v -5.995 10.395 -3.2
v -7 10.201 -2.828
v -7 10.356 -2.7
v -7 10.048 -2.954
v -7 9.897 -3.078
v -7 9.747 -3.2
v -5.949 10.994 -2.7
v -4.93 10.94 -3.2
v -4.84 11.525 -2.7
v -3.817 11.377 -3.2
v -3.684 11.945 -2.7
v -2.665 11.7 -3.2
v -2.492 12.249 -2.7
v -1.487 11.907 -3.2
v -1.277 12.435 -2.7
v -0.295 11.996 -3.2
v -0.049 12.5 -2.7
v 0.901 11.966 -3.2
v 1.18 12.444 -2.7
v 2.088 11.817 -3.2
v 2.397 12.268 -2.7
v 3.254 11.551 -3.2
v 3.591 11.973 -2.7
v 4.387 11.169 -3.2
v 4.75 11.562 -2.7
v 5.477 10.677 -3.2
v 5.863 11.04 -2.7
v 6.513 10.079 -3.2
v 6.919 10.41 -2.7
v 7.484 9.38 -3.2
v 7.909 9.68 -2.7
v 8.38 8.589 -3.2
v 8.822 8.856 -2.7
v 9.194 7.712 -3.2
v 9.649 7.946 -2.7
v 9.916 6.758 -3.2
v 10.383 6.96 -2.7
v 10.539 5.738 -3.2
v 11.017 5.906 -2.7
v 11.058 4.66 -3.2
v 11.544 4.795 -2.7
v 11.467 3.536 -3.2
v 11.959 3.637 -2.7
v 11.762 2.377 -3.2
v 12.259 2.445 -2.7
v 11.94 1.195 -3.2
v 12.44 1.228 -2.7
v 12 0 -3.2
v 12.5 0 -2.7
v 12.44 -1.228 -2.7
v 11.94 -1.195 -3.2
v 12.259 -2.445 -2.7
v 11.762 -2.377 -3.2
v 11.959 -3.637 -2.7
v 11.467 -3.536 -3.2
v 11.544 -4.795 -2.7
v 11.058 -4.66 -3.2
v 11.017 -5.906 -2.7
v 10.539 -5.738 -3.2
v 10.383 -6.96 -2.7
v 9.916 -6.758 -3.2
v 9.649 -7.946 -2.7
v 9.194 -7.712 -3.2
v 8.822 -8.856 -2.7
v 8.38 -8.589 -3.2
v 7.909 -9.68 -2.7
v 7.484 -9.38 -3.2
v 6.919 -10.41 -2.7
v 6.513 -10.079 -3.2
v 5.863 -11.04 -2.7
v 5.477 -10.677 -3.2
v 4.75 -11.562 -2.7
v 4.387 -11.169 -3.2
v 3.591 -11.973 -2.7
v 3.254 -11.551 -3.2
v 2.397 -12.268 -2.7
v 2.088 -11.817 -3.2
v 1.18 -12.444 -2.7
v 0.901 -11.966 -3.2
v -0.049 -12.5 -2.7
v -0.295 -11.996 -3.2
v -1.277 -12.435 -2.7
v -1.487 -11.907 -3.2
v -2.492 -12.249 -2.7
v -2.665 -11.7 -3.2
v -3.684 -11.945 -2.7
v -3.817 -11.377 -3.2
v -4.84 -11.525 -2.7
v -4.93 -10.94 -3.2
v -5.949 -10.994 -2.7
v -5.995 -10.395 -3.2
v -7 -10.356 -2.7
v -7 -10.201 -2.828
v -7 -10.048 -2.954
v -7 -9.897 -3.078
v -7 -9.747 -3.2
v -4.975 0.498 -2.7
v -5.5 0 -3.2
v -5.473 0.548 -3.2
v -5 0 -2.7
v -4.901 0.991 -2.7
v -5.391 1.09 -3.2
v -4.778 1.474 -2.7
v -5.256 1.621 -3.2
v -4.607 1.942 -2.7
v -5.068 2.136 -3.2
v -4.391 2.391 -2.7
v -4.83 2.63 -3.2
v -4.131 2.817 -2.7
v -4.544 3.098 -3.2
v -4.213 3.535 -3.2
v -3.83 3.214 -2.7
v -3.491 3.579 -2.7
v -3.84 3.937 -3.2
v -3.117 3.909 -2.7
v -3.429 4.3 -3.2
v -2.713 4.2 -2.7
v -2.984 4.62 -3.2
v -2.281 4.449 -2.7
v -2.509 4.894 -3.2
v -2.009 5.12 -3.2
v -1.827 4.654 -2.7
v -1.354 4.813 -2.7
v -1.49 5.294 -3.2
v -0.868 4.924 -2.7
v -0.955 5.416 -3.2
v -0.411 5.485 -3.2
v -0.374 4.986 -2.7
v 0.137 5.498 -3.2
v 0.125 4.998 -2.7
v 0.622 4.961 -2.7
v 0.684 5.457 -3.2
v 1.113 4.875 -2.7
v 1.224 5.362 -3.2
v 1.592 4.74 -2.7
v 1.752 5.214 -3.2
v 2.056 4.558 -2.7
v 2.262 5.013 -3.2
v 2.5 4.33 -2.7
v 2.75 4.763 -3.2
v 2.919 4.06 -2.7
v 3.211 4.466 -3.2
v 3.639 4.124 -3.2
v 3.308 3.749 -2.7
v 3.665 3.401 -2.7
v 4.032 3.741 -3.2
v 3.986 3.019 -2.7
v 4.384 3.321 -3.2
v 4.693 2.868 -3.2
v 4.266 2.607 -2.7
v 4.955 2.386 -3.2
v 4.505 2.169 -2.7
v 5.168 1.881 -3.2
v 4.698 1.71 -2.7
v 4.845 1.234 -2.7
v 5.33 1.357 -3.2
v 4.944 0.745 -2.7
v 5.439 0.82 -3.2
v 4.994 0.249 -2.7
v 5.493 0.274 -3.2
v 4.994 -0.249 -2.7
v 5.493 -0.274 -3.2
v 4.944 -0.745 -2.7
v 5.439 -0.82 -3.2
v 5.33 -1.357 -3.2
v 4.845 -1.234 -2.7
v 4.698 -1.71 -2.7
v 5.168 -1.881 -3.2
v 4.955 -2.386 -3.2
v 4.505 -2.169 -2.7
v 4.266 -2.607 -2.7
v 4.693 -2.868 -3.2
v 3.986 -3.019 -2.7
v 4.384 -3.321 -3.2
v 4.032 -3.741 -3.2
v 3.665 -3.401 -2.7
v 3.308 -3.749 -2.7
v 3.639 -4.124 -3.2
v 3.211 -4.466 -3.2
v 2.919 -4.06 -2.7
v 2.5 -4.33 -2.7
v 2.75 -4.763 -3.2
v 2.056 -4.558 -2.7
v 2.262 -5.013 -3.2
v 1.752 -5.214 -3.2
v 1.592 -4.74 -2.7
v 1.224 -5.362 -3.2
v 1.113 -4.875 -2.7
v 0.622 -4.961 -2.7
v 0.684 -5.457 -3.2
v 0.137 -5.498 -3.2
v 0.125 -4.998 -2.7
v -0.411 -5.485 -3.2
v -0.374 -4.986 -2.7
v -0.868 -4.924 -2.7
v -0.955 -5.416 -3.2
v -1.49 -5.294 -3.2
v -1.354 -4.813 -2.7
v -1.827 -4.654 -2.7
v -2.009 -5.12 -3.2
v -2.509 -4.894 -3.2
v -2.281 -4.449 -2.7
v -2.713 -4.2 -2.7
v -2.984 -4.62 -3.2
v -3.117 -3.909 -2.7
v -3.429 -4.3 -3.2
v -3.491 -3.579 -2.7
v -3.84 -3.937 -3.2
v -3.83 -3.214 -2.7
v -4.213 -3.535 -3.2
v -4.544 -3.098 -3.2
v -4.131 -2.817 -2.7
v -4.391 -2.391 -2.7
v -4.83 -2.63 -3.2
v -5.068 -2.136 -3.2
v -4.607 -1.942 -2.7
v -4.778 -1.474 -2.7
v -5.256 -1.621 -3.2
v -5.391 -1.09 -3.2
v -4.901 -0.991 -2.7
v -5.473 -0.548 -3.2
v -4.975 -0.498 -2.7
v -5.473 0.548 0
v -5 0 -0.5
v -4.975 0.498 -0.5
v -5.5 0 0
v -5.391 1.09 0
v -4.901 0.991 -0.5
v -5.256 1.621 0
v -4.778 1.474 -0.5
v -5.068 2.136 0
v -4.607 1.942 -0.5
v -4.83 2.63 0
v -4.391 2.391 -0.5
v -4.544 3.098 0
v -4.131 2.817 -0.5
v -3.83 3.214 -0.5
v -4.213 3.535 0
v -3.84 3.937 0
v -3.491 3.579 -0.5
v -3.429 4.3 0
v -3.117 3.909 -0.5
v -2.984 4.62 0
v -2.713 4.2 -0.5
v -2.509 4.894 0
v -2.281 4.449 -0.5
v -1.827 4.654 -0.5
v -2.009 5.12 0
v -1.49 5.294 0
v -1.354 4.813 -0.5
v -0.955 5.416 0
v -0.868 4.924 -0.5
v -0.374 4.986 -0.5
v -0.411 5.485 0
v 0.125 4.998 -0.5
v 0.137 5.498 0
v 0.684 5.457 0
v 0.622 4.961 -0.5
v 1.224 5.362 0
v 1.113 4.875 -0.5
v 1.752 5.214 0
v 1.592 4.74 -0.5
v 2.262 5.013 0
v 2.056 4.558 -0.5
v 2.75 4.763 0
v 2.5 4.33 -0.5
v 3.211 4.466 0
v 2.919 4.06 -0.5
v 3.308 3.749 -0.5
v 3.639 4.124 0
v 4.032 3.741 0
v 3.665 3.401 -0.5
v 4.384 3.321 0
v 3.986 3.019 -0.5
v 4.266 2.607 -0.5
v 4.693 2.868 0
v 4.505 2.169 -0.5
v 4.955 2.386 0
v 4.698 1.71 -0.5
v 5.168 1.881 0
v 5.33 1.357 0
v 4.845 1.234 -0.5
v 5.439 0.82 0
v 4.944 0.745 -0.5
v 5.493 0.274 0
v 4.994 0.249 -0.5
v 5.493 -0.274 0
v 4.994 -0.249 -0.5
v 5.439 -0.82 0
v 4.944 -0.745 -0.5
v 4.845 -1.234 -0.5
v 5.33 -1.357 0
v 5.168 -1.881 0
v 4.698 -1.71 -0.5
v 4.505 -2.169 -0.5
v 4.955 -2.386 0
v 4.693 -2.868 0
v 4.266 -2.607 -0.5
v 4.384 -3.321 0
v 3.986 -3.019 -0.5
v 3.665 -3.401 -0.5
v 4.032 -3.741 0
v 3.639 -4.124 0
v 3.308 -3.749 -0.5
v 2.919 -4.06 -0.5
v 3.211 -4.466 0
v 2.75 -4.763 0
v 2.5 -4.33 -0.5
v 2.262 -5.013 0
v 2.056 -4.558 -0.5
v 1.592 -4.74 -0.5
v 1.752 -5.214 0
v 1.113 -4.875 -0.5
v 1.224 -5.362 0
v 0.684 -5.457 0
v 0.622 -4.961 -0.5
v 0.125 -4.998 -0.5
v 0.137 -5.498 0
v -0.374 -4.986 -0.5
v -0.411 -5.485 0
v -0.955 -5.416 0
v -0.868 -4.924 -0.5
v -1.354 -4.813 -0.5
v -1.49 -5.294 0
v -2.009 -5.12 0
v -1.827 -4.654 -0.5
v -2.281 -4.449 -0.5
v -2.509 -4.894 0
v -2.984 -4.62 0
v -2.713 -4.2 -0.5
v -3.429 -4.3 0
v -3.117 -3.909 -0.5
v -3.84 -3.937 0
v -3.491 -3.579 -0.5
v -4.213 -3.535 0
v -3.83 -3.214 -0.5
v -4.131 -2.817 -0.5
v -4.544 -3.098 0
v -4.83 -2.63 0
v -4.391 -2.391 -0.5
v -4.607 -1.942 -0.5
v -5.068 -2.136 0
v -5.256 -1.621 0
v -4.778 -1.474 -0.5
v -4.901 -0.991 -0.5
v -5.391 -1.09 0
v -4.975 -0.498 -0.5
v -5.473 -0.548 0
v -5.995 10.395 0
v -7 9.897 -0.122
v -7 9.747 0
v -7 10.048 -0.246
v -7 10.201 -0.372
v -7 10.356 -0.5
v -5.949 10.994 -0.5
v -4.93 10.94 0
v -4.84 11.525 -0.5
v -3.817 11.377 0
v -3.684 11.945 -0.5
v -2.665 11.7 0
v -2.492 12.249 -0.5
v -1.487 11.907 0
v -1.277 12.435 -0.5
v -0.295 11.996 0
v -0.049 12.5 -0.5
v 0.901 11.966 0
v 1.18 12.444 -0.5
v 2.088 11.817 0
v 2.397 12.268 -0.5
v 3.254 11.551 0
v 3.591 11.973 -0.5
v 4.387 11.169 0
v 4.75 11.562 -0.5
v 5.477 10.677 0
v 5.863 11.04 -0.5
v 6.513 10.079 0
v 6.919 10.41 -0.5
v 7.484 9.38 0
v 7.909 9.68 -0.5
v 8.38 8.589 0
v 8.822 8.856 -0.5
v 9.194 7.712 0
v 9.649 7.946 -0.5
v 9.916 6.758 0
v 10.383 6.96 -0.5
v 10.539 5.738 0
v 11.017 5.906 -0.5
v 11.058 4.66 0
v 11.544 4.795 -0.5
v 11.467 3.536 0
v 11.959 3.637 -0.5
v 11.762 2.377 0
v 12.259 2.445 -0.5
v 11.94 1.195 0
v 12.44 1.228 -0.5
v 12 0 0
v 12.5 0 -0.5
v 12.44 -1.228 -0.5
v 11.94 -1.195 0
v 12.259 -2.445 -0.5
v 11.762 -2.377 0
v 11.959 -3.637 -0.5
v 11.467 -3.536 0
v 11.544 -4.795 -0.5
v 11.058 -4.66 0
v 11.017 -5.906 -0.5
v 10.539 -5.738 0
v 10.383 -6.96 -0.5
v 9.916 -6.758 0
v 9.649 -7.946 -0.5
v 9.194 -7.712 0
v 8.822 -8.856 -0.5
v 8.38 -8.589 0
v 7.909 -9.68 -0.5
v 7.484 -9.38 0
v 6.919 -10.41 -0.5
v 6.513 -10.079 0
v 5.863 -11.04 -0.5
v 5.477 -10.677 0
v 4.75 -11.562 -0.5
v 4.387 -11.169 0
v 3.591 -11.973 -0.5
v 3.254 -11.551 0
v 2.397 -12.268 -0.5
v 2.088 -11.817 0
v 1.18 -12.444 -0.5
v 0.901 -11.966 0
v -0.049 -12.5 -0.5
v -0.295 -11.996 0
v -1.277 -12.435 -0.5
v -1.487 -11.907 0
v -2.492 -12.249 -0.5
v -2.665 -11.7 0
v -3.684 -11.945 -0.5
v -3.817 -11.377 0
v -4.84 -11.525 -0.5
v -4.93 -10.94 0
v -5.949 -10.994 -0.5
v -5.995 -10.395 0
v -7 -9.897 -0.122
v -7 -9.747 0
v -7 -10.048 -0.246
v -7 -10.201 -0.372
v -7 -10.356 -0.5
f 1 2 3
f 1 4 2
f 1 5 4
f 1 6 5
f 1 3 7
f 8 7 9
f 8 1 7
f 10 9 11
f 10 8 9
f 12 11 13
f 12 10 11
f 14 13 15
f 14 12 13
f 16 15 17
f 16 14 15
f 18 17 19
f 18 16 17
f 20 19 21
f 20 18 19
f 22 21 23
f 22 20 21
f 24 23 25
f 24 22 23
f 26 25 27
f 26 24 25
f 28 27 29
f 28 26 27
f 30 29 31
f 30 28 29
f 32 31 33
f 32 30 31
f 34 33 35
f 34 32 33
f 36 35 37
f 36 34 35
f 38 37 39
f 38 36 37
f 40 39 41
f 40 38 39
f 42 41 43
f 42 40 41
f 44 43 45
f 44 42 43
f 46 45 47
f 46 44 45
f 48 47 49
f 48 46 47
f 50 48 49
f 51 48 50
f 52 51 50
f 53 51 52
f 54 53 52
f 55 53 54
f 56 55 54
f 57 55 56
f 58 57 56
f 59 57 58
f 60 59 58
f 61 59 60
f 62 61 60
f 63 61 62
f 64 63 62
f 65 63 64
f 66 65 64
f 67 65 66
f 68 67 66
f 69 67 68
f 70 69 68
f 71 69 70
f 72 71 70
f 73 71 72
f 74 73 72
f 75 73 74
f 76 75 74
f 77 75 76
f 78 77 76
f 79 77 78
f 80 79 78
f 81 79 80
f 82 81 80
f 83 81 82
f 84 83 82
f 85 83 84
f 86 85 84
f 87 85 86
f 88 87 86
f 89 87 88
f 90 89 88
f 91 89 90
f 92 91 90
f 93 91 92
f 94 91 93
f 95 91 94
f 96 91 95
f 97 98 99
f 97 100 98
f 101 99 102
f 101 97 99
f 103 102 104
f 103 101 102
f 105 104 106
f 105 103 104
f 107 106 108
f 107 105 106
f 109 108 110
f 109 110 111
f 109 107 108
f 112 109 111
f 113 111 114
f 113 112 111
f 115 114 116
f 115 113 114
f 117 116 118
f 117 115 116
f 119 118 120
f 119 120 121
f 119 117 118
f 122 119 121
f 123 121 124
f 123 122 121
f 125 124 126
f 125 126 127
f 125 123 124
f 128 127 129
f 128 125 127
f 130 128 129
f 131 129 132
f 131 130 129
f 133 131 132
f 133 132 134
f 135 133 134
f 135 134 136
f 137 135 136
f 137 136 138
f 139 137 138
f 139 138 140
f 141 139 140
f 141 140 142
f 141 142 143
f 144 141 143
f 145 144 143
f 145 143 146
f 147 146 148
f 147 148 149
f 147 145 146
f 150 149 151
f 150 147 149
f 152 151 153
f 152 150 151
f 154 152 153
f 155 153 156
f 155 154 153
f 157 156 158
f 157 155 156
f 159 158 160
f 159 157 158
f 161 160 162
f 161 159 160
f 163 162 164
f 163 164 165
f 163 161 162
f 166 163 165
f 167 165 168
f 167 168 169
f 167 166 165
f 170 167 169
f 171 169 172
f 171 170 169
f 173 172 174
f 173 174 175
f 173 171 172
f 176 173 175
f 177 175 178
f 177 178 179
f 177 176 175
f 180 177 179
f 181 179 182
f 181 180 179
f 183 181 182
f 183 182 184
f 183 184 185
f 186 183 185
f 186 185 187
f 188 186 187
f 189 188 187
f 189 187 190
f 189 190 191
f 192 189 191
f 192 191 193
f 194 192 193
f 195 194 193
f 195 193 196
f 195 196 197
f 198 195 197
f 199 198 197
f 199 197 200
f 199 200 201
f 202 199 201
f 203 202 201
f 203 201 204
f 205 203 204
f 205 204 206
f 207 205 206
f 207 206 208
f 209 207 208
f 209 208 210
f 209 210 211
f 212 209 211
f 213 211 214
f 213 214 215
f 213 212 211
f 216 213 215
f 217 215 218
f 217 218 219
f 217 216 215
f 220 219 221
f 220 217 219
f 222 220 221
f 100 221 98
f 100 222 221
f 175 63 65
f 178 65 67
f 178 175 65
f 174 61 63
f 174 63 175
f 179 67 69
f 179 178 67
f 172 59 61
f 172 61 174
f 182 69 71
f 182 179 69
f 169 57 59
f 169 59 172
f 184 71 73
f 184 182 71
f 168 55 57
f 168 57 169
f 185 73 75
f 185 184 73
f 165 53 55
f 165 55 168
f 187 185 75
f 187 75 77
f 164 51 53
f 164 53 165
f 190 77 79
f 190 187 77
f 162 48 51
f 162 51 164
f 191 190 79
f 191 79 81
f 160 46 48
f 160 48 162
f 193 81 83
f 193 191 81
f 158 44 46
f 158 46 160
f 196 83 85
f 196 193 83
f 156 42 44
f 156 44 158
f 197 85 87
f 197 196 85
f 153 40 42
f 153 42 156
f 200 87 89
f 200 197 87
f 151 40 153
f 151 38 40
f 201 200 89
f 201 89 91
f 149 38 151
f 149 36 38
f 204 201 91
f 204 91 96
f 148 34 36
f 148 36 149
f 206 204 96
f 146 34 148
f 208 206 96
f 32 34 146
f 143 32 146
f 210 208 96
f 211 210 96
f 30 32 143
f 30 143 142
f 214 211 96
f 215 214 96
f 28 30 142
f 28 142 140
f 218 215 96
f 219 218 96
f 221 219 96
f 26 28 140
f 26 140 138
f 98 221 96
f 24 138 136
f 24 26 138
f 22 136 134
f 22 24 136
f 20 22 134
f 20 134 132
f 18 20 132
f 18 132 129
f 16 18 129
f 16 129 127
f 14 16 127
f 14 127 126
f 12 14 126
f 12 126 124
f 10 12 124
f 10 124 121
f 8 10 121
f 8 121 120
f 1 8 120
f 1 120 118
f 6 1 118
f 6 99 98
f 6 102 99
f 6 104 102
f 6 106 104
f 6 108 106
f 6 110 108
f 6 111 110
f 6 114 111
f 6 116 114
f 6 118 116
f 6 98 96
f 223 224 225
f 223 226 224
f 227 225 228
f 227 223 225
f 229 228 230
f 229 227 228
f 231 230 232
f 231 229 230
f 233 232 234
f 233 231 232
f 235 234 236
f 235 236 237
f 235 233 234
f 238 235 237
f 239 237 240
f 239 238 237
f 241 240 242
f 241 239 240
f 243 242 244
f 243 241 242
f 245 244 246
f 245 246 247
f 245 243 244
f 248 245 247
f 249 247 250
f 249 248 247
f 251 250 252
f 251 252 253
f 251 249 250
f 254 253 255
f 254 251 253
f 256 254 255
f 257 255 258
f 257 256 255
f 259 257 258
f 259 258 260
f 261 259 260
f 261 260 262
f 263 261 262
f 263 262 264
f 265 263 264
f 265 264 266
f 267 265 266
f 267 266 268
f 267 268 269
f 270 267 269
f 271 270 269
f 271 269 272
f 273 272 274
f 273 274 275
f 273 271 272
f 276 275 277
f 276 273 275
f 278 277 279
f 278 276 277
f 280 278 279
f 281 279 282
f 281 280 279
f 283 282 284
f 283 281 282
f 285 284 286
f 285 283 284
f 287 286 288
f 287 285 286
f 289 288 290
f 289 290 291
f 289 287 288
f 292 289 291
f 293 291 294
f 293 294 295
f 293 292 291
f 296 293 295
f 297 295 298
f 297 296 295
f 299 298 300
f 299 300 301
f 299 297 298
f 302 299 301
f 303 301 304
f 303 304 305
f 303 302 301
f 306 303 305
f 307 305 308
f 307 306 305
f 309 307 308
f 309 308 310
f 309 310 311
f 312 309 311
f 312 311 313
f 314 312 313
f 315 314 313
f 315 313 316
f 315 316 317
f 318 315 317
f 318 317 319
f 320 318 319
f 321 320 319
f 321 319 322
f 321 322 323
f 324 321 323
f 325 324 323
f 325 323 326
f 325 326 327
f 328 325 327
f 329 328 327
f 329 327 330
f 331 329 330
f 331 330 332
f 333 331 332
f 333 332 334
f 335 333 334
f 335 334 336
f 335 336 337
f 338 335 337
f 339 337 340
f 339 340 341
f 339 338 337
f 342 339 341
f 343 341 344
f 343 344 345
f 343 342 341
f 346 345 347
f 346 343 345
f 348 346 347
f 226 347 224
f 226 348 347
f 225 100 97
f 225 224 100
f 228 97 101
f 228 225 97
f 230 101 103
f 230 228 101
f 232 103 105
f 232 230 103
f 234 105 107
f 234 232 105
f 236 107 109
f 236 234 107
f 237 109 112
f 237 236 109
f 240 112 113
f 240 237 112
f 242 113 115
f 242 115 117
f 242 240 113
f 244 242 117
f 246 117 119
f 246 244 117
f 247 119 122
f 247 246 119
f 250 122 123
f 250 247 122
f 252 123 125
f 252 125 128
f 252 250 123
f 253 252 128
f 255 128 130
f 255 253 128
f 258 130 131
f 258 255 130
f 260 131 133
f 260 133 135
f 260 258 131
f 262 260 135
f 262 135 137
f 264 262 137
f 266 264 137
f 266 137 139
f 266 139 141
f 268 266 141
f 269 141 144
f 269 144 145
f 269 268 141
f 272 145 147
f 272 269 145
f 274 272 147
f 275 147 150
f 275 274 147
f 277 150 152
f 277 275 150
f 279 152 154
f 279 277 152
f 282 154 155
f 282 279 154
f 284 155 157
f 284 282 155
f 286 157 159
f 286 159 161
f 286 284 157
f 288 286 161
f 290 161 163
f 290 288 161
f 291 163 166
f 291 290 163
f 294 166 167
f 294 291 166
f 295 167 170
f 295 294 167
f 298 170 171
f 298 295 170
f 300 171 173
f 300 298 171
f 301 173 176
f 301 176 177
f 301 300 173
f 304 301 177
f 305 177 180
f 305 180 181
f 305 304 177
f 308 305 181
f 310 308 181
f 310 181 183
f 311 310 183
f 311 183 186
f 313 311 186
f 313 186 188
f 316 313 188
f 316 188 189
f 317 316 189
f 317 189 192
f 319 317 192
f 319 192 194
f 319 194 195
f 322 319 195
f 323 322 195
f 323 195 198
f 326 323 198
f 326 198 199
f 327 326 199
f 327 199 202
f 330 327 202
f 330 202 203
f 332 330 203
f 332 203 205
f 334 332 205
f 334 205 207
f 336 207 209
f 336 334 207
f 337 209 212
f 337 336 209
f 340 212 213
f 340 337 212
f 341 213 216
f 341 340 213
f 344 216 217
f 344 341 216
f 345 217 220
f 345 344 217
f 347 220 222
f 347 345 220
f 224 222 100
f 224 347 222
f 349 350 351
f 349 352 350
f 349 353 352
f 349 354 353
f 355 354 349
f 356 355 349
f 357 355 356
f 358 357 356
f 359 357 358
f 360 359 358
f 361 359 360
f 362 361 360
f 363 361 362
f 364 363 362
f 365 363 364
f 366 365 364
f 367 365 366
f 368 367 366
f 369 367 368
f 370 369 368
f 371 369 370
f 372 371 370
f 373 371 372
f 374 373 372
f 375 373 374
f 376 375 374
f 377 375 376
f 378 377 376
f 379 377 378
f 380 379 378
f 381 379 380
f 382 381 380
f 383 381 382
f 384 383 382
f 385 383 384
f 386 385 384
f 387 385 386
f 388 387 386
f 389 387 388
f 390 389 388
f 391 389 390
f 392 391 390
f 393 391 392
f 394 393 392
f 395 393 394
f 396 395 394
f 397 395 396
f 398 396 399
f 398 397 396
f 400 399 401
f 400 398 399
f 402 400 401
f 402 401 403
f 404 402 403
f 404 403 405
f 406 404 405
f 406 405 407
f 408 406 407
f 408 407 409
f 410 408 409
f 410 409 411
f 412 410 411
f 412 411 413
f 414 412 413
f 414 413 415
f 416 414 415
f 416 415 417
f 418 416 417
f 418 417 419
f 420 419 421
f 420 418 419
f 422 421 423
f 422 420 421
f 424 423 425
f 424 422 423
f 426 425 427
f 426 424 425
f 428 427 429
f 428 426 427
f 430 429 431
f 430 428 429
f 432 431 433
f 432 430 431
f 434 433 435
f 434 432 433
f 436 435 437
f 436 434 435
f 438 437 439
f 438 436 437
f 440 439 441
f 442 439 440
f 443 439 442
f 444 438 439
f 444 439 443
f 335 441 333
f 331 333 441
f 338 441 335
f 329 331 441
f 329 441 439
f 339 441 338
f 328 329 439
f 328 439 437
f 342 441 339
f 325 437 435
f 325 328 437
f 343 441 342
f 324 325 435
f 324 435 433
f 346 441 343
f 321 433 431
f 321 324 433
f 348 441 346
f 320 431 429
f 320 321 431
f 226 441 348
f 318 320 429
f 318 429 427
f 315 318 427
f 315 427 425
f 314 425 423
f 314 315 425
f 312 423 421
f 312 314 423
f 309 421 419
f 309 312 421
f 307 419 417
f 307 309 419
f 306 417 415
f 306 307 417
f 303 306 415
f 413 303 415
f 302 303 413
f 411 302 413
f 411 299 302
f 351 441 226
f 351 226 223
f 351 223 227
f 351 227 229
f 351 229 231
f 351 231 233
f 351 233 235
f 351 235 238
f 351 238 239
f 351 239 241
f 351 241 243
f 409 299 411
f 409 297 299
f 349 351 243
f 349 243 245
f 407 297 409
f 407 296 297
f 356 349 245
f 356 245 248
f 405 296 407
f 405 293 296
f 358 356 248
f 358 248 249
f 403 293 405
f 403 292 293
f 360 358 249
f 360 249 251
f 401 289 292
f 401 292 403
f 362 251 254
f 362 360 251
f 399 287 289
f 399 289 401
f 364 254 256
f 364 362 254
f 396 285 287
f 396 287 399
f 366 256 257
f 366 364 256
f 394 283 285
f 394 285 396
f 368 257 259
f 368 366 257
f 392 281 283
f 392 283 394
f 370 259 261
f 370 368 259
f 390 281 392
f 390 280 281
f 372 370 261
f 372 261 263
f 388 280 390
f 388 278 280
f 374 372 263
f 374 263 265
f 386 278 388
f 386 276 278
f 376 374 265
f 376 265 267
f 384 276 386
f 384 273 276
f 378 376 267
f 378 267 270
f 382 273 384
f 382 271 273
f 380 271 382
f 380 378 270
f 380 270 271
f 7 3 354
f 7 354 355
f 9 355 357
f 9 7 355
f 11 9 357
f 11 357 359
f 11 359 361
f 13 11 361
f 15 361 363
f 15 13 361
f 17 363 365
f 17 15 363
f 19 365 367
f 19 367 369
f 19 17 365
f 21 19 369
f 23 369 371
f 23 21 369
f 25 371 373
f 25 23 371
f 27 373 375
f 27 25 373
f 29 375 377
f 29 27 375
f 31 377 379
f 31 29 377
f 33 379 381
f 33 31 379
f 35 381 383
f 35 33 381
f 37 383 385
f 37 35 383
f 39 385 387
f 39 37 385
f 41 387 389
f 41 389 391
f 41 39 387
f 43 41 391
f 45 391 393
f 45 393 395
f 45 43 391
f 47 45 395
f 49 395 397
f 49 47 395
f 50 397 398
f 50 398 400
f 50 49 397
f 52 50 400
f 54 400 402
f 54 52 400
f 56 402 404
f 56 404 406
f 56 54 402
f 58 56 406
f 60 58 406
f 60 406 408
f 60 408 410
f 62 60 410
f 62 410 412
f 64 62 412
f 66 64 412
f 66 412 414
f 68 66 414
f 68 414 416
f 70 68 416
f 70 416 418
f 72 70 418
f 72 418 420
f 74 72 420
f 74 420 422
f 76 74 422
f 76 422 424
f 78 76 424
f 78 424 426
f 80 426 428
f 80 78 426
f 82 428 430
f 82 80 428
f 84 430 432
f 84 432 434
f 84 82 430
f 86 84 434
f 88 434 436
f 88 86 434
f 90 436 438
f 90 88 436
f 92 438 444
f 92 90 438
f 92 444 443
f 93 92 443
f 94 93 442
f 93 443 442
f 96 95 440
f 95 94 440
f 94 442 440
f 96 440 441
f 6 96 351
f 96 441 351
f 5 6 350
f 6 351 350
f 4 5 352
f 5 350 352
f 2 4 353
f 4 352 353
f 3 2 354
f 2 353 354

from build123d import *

# Parameters (mm, degrees)
SKETCH_2_W          = 25
SKETCH_2_H          = 25
CUT_EXTRUDE_1_DEPTH = 3.2


with BuildPart() as part:
    # 草图1 → 旋转1 (revolve)
    with BuildSketch(Plane(origin=(0, 0, 0), x_dir=(1, 0, 0), z_dir=(0, 1, 0))):
        Polygon((5, 2.7), (5, 0.5), (5.5, 0), (12, 0), (12.5, 0.5), (12.5, 2.7), (12, 3.2), (5.5, 3.2), align=None)
    revolve(axis=Axis((0, 0, 3), (0, 0, -1)))

    # 草图2 → 切除-拉伸1 (cut)
    with BuildSketch(Plane.XY):
        with Locations((-19.5, 0)):
            Rectangle(SKETCH_2_W, SKETCH_2_H)
    extrude(amount=-CUT_EXTRUDE_1_DEPTH, mode=Mode.SUBTRACT)


solid = part.part
